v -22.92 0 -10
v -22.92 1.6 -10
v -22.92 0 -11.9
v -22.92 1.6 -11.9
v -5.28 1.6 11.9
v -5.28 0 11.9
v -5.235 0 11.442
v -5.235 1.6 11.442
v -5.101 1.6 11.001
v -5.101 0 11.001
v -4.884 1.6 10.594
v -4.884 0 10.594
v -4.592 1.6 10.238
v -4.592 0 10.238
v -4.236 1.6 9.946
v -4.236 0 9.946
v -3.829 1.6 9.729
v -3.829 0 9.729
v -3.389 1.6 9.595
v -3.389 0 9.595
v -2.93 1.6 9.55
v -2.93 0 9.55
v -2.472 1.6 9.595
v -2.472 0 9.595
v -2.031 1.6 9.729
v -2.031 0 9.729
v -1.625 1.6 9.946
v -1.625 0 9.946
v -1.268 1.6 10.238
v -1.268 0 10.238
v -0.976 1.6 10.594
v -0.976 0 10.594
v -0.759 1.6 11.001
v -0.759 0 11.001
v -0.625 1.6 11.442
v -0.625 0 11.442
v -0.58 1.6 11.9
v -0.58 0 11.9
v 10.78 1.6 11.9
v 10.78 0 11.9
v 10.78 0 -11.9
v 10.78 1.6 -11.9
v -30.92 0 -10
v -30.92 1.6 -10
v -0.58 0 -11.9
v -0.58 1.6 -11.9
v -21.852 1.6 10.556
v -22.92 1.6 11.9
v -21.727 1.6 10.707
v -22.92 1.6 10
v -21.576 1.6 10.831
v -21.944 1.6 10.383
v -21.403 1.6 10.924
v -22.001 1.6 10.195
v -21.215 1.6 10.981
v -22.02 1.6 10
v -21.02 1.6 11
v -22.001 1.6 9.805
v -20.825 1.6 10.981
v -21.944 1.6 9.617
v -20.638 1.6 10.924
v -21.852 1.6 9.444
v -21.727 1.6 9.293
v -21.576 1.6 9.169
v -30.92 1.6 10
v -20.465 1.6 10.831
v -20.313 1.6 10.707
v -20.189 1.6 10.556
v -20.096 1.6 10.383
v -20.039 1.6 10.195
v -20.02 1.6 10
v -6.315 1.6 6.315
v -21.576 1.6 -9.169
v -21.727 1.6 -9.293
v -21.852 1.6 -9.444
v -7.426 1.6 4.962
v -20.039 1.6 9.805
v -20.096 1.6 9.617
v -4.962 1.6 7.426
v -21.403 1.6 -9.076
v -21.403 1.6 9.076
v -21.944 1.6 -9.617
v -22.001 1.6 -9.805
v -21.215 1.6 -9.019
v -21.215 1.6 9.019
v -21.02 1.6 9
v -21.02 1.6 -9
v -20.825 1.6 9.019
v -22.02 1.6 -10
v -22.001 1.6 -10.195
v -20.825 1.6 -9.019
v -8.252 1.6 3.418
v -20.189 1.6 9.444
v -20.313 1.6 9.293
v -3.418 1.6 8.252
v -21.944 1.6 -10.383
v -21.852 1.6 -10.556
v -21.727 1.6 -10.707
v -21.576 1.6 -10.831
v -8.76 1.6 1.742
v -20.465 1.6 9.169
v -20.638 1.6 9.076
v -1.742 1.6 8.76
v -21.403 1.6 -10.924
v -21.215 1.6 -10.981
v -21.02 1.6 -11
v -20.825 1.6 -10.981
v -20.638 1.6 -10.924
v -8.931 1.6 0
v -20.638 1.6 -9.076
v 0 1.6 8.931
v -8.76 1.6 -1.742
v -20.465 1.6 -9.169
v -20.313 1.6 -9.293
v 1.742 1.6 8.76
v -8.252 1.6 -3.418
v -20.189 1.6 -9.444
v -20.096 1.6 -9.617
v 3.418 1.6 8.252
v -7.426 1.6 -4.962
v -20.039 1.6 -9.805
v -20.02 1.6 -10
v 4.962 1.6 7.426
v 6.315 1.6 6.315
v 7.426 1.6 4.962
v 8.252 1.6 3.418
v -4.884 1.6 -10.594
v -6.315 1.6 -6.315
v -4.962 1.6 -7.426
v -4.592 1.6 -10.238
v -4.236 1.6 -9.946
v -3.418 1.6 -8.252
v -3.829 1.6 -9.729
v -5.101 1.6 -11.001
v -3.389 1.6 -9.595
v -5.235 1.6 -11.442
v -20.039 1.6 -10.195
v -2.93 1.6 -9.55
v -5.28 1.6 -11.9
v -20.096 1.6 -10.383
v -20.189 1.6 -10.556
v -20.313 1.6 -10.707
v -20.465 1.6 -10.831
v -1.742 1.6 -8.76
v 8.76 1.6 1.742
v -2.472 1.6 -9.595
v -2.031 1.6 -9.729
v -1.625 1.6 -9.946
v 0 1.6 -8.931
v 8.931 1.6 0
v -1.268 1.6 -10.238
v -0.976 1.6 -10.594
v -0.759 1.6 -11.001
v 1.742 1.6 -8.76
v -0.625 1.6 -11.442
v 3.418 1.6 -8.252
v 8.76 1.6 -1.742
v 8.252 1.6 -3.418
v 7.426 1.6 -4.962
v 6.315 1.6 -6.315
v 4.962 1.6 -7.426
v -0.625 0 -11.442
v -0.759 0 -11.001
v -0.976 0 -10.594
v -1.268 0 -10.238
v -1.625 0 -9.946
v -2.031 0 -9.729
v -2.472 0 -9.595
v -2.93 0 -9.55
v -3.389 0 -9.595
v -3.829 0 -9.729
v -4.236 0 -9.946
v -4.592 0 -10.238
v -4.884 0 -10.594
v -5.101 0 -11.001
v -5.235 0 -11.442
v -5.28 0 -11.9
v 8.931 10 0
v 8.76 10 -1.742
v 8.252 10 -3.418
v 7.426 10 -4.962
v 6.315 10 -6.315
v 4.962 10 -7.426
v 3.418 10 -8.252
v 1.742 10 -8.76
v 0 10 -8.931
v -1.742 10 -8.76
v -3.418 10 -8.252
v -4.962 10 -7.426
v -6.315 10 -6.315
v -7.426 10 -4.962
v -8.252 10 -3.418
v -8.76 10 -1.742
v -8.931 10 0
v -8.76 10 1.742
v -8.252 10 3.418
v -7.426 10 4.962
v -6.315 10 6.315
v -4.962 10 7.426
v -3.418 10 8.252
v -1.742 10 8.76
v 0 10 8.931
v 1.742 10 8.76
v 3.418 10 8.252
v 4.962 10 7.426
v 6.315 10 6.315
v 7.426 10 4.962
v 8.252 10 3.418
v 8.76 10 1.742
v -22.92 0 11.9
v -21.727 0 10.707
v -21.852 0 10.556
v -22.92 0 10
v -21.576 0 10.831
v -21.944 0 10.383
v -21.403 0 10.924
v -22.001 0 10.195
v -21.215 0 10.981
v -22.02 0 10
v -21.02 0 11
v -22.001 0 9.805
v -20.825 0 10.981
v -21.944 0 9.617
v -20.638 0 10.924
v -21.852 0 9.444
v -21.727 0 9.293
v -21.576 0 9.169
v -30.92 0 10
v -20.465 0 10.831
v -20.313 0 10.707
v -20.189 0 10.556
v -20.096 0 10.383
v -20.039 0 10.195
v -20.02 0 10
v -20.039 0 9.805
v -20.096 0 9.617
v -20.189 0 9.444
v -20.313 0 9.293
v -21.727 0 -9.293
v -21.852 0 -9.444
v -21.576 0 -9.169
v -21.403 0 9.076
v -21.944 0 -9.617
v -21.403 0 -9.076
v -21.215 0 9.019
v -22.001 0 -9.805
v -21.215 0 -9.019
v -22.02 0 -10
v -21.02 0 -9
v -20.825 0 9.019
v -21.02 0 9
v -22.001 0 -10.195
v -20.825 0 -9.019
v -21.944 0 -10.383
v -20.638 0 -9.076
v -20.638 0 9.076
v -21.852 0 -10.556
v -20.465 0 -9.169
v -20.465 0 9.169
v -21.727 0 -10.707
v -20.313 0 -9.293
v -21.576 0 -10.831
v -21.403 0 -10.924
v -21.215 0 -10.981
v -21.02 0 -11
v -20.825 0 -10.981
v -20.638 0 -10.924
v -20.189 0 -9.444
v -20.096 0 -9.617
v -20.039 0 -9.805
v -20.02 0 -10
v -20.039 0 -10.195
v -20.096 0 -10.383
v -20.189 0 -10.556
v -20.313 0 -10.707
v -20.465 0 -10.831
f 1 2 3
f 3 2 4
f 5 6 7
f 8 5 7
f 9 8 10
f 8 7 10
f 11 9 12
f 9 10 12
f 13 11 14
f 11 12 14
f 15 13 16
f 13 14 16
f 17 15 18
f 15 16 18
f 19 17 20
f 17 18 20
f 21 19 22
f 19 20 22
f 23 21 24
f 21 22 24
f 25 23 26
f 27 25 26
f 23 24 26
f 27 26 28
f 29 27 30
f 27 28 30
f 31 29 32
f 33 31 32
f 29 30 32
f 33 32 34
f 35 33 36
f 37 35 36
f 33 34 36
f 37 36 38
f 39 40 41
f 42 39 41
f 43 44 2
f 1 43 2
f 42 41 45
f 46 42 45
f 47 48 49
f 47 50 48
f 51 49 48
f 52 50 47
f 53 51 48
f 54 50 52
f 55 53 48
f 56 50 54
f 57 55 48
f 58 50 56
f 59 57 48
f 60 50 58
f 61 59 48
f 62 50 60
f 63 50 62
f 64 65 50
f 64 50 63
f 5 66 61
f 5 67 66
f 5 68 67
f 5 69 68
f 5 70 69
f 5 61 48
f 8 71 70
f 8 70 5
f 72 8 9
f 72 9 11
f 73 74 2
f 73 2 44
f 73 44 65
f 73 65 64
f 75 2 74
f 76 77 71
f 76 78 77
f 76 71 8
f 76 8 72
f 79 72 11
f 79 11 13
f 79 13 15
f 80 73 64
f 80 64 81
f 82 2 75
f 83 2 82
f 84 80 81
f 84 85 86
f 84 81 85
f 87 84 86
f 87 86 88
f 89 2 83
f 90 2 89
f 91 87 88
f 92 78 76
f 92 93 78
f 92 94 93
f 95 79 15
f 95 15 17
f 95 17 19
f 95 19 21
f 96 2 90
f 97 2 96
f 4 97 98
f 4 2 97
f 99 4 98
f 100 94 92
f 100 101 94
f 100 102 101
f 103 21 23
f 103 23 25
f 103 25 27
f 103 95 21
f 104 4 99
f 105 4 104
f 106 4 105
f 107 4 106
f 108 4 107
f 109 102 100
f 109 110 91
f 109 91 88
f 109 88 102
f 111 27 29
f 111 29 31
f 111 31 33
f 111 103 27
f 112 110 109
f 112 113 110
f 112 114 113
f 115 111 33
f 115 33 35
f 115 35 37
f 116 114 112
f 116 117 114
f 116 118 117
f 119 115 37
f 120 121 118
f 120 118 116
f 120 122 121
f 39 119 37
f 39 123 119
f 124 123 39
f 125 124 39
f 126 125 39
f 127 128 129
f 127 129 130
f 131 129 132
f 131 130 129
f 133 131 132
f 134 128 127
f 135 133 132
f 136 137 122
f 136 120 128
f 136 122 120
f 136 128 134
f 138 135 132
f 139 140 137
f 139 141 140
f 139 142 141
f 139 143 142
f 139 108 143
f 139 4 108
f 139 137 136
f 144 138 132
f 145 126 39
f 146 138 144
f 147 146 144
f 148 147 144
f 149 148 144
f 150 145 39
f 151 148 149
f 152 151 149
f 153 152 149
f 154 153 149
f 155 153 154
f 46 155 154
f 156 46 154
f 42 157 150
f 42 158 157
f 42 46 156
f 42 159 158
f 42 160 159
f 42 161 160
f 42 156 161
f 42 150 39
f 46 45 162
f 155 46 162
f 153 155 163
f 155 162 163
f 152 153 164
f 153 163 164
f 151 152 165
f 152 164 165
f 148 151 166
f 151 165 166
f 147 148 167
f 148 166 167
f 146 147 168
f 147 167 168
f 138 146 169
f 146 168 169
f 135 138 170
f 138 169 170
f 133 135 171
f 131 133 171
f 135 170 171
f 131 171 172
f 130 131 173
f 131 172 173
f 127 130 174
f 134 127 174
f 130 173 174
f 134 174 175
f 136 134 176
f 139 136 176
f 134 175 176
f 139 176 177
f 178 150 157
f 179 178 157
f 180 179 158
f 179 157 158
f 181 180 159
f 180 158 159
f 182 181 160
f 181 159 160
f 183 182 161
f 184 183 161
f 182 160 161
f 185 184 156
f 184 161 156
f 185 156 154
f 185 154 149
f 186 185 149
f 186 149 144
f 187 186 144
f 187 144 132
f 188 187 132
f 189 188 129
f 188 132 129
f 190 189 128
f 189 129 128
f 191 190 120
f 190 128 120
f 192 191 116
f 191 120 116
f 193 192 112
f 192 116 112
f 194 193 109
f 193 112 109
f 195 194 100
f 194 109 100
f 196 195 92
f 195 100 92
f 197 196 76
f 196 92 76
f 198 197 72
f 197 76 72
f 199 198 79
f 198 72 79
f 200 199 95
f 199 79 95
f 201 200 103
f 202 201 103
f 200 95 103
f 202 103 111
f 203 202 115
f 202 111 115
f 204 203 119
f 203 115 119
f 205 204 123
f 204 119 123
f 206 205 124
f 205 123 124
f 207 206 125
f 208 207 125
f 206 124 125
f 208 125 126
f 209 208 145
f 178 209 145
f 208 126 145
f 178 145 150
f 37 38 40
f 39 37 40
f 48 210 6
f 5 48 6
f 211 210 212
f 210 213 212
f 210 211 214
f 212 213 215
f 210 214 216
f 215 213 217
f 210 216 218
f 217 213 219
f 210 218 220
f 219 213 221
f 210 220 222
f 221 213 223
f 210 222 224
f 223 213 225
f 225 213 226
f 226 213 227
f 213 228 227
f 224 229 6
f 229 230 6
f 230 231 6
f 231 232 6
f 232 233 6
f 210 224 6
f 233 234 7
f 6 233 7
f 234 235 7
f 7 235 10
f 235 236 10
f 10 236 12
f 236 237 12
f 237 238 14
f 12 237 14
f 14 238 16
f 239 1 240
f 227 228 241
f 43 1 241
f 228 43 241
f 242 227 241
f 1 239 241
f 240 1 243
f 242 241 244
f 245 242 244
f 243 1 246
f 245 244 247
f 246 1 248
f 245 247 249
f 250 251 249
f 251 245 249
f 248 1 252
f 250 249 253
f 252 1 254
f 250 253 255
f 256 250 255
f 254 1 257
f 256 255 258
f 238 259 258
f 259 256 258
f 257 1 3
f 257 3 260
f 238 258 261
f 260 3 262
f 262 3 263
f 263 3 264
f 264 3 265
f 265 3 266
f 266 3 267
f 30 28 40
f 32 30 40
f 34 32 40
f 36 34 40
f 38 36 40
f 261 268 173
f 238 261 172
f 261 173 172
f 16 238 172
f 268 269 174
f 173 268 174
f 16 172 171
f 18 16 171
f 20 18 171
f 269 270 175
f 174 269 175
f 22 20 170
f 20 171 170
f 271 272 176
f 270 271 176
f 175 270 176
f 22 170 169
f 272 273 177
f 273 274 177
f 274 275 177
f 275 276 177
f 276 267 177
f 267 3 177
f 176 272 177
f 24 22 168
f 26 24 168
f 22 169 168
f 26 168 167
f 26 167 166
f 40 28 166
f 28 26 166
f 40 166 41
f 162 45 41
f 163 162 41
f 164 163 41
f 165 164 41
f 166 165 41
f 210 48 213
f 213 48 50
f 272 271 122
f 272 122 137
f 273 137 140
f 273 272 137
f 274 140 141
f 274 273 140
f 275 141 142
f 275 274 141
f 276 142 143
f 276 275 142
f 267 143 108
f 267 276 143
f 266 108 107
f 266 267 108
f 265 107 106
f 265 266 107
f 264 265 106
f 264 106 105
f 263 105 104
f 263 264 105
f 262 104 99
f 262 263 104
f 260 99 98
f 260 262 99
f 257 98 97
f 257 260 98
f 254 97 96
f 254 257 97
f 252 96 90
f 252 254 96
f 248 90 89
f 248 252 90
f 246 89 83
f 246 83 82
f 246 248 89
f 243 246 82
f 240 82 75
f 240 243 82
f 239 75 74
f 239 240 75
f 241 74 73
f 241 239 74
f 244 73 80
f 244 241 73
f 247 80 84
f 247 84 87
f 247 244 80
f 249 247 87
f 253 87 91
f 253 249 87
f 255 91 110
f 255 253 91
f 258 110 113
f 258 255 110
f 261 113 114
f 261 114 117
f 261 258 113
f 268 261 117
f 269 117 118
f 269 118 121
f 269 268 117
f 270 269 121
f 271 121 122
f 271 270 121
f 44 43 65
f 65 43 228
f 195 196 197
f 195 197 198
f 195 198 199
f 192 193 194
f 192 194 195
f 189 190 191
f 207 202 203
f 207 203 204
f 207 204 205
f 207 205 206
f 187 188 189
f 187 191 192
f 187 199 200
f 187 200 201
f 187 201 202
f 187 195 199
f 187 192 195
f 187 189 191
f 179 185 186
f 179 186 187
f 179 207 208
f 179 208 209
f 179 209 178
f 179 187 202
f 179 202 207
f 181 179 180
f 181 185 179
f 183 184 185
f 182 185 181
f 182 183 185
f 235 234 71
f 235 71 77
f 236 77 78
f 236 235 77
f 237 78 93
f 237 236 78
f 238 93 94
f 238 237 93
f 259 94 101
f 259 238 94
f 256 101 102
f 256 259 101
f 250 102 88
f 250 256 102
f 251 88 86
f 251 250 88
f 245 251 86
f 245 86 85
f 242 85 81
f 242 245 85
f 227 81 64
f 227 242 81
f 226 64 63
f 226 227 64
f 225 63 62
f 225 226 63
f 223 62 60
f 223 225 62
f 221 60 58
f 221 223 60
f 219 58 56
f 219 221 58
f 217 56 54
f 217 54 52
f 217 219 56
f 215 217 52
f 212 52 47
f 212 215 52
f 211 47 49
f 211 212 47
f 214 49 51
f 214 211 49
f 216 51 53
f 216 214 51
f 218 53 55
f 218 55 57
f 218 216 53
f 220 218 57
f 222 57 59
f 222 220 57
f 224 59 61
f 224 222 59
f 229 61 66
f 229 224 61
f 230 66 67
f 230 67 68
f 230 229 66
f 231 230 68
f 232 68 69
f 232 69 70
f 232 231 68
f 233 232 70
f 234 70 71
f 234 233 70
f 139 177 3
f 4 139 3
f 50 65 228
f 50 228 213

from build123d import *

# Parameters (mm, degrees)
SKETCH1_R               = 1
BOSS_EXTRUDE1_DEPTH     = 1.6
SKETCH2_R               = 8.931361996
BOSS_EXTRUDE2_DEPTH     = 8.4
SKETCH3_W               = 8
SKETCH3_H               = 1.9
CUT_EXTRUDE1_DEPTH      = 9.4
CUT_EXTRUDE1_DEPTH_BACK = 2.6


with BuildPart() as part:
    # Sketch1 → Boss-Extrude1 (new body)
    with BuildSketch(Plane(origin=(0, 0, 0), x_dir=(1, 0, 0), z_dir=(0, 1, 0))):
        with BuildLine():
            Line((10.779760555, 11.9), (-0.580107175, 11.9))
            ThreePointArc((-0.580107175, 11.9), (-2.930107175, 9.55), (-5.280107175, 11.9))
            Line((-5.280107175, 11.9), (-30.920239445, 11.9))
            Line((-30.920239445, 11.9), (-30.920239445, -11.9))
            Line((-30.920239445, -11.9), (-5.280107175, -11.9))
            ThreePointArc((-5.280107175, -11.9), (-2.930107175, -9.55), (-0.580107175, -11.9))
            Line((-0.580107175, -11.9), (10.779760555, -11.9))
            Line((10.779760555, -11.9), (10.779760555, 11.9))
        make_face()
        with Locations((-21.020239445, -10)):
            Circle(SKETCH1_R, mode=Mode.SUBTRACT)
        with Locations((-21.020239445, 10)):
            Circle(SKETCH1_R, mode=Mode.SUBTRACT)
    extrude(amount=BOSS_EXTRUDE1_DEPTH)

    # Sketch2 → Boss-Extrude2 (add)
    with BuildSketch(Plane(origin=(0, 1.6, 0), x_dir=(1, 0, 0), z_dir=(0, 1, 0))):
        Circle(SKETCH2_R)
    extrude(amount=BOSS_EXTRUDE2_DEPTH)

    # Sketch3 → Cut-Extrude1 (cut, two sides)
    with BuildSketch(Plane(origin=(0, 1.6, 0), x_dir=(1, 0, 0), z_dir=(0, 1, 0))) as cut_extrude1_sk:
        with Locations((-26.920239445, 10.95)):
            Rectangle(SKETCH3_W, SKETCH3_H)
        with Locations((-26.920239445, -10.95)):
            Rectangle(SKETCH3_W, SKETCH3_H)
    extrude(amount=CUT_EXTRUDE1_DEPTH, mode=Mode.SUBTRACT)
    extrude(cut_extrude1_sk.sketch, amount=-CUT_EXTRUDE1_DEPTH_BACK, mode=Mode.SUBTRACT)


solid = part.part
